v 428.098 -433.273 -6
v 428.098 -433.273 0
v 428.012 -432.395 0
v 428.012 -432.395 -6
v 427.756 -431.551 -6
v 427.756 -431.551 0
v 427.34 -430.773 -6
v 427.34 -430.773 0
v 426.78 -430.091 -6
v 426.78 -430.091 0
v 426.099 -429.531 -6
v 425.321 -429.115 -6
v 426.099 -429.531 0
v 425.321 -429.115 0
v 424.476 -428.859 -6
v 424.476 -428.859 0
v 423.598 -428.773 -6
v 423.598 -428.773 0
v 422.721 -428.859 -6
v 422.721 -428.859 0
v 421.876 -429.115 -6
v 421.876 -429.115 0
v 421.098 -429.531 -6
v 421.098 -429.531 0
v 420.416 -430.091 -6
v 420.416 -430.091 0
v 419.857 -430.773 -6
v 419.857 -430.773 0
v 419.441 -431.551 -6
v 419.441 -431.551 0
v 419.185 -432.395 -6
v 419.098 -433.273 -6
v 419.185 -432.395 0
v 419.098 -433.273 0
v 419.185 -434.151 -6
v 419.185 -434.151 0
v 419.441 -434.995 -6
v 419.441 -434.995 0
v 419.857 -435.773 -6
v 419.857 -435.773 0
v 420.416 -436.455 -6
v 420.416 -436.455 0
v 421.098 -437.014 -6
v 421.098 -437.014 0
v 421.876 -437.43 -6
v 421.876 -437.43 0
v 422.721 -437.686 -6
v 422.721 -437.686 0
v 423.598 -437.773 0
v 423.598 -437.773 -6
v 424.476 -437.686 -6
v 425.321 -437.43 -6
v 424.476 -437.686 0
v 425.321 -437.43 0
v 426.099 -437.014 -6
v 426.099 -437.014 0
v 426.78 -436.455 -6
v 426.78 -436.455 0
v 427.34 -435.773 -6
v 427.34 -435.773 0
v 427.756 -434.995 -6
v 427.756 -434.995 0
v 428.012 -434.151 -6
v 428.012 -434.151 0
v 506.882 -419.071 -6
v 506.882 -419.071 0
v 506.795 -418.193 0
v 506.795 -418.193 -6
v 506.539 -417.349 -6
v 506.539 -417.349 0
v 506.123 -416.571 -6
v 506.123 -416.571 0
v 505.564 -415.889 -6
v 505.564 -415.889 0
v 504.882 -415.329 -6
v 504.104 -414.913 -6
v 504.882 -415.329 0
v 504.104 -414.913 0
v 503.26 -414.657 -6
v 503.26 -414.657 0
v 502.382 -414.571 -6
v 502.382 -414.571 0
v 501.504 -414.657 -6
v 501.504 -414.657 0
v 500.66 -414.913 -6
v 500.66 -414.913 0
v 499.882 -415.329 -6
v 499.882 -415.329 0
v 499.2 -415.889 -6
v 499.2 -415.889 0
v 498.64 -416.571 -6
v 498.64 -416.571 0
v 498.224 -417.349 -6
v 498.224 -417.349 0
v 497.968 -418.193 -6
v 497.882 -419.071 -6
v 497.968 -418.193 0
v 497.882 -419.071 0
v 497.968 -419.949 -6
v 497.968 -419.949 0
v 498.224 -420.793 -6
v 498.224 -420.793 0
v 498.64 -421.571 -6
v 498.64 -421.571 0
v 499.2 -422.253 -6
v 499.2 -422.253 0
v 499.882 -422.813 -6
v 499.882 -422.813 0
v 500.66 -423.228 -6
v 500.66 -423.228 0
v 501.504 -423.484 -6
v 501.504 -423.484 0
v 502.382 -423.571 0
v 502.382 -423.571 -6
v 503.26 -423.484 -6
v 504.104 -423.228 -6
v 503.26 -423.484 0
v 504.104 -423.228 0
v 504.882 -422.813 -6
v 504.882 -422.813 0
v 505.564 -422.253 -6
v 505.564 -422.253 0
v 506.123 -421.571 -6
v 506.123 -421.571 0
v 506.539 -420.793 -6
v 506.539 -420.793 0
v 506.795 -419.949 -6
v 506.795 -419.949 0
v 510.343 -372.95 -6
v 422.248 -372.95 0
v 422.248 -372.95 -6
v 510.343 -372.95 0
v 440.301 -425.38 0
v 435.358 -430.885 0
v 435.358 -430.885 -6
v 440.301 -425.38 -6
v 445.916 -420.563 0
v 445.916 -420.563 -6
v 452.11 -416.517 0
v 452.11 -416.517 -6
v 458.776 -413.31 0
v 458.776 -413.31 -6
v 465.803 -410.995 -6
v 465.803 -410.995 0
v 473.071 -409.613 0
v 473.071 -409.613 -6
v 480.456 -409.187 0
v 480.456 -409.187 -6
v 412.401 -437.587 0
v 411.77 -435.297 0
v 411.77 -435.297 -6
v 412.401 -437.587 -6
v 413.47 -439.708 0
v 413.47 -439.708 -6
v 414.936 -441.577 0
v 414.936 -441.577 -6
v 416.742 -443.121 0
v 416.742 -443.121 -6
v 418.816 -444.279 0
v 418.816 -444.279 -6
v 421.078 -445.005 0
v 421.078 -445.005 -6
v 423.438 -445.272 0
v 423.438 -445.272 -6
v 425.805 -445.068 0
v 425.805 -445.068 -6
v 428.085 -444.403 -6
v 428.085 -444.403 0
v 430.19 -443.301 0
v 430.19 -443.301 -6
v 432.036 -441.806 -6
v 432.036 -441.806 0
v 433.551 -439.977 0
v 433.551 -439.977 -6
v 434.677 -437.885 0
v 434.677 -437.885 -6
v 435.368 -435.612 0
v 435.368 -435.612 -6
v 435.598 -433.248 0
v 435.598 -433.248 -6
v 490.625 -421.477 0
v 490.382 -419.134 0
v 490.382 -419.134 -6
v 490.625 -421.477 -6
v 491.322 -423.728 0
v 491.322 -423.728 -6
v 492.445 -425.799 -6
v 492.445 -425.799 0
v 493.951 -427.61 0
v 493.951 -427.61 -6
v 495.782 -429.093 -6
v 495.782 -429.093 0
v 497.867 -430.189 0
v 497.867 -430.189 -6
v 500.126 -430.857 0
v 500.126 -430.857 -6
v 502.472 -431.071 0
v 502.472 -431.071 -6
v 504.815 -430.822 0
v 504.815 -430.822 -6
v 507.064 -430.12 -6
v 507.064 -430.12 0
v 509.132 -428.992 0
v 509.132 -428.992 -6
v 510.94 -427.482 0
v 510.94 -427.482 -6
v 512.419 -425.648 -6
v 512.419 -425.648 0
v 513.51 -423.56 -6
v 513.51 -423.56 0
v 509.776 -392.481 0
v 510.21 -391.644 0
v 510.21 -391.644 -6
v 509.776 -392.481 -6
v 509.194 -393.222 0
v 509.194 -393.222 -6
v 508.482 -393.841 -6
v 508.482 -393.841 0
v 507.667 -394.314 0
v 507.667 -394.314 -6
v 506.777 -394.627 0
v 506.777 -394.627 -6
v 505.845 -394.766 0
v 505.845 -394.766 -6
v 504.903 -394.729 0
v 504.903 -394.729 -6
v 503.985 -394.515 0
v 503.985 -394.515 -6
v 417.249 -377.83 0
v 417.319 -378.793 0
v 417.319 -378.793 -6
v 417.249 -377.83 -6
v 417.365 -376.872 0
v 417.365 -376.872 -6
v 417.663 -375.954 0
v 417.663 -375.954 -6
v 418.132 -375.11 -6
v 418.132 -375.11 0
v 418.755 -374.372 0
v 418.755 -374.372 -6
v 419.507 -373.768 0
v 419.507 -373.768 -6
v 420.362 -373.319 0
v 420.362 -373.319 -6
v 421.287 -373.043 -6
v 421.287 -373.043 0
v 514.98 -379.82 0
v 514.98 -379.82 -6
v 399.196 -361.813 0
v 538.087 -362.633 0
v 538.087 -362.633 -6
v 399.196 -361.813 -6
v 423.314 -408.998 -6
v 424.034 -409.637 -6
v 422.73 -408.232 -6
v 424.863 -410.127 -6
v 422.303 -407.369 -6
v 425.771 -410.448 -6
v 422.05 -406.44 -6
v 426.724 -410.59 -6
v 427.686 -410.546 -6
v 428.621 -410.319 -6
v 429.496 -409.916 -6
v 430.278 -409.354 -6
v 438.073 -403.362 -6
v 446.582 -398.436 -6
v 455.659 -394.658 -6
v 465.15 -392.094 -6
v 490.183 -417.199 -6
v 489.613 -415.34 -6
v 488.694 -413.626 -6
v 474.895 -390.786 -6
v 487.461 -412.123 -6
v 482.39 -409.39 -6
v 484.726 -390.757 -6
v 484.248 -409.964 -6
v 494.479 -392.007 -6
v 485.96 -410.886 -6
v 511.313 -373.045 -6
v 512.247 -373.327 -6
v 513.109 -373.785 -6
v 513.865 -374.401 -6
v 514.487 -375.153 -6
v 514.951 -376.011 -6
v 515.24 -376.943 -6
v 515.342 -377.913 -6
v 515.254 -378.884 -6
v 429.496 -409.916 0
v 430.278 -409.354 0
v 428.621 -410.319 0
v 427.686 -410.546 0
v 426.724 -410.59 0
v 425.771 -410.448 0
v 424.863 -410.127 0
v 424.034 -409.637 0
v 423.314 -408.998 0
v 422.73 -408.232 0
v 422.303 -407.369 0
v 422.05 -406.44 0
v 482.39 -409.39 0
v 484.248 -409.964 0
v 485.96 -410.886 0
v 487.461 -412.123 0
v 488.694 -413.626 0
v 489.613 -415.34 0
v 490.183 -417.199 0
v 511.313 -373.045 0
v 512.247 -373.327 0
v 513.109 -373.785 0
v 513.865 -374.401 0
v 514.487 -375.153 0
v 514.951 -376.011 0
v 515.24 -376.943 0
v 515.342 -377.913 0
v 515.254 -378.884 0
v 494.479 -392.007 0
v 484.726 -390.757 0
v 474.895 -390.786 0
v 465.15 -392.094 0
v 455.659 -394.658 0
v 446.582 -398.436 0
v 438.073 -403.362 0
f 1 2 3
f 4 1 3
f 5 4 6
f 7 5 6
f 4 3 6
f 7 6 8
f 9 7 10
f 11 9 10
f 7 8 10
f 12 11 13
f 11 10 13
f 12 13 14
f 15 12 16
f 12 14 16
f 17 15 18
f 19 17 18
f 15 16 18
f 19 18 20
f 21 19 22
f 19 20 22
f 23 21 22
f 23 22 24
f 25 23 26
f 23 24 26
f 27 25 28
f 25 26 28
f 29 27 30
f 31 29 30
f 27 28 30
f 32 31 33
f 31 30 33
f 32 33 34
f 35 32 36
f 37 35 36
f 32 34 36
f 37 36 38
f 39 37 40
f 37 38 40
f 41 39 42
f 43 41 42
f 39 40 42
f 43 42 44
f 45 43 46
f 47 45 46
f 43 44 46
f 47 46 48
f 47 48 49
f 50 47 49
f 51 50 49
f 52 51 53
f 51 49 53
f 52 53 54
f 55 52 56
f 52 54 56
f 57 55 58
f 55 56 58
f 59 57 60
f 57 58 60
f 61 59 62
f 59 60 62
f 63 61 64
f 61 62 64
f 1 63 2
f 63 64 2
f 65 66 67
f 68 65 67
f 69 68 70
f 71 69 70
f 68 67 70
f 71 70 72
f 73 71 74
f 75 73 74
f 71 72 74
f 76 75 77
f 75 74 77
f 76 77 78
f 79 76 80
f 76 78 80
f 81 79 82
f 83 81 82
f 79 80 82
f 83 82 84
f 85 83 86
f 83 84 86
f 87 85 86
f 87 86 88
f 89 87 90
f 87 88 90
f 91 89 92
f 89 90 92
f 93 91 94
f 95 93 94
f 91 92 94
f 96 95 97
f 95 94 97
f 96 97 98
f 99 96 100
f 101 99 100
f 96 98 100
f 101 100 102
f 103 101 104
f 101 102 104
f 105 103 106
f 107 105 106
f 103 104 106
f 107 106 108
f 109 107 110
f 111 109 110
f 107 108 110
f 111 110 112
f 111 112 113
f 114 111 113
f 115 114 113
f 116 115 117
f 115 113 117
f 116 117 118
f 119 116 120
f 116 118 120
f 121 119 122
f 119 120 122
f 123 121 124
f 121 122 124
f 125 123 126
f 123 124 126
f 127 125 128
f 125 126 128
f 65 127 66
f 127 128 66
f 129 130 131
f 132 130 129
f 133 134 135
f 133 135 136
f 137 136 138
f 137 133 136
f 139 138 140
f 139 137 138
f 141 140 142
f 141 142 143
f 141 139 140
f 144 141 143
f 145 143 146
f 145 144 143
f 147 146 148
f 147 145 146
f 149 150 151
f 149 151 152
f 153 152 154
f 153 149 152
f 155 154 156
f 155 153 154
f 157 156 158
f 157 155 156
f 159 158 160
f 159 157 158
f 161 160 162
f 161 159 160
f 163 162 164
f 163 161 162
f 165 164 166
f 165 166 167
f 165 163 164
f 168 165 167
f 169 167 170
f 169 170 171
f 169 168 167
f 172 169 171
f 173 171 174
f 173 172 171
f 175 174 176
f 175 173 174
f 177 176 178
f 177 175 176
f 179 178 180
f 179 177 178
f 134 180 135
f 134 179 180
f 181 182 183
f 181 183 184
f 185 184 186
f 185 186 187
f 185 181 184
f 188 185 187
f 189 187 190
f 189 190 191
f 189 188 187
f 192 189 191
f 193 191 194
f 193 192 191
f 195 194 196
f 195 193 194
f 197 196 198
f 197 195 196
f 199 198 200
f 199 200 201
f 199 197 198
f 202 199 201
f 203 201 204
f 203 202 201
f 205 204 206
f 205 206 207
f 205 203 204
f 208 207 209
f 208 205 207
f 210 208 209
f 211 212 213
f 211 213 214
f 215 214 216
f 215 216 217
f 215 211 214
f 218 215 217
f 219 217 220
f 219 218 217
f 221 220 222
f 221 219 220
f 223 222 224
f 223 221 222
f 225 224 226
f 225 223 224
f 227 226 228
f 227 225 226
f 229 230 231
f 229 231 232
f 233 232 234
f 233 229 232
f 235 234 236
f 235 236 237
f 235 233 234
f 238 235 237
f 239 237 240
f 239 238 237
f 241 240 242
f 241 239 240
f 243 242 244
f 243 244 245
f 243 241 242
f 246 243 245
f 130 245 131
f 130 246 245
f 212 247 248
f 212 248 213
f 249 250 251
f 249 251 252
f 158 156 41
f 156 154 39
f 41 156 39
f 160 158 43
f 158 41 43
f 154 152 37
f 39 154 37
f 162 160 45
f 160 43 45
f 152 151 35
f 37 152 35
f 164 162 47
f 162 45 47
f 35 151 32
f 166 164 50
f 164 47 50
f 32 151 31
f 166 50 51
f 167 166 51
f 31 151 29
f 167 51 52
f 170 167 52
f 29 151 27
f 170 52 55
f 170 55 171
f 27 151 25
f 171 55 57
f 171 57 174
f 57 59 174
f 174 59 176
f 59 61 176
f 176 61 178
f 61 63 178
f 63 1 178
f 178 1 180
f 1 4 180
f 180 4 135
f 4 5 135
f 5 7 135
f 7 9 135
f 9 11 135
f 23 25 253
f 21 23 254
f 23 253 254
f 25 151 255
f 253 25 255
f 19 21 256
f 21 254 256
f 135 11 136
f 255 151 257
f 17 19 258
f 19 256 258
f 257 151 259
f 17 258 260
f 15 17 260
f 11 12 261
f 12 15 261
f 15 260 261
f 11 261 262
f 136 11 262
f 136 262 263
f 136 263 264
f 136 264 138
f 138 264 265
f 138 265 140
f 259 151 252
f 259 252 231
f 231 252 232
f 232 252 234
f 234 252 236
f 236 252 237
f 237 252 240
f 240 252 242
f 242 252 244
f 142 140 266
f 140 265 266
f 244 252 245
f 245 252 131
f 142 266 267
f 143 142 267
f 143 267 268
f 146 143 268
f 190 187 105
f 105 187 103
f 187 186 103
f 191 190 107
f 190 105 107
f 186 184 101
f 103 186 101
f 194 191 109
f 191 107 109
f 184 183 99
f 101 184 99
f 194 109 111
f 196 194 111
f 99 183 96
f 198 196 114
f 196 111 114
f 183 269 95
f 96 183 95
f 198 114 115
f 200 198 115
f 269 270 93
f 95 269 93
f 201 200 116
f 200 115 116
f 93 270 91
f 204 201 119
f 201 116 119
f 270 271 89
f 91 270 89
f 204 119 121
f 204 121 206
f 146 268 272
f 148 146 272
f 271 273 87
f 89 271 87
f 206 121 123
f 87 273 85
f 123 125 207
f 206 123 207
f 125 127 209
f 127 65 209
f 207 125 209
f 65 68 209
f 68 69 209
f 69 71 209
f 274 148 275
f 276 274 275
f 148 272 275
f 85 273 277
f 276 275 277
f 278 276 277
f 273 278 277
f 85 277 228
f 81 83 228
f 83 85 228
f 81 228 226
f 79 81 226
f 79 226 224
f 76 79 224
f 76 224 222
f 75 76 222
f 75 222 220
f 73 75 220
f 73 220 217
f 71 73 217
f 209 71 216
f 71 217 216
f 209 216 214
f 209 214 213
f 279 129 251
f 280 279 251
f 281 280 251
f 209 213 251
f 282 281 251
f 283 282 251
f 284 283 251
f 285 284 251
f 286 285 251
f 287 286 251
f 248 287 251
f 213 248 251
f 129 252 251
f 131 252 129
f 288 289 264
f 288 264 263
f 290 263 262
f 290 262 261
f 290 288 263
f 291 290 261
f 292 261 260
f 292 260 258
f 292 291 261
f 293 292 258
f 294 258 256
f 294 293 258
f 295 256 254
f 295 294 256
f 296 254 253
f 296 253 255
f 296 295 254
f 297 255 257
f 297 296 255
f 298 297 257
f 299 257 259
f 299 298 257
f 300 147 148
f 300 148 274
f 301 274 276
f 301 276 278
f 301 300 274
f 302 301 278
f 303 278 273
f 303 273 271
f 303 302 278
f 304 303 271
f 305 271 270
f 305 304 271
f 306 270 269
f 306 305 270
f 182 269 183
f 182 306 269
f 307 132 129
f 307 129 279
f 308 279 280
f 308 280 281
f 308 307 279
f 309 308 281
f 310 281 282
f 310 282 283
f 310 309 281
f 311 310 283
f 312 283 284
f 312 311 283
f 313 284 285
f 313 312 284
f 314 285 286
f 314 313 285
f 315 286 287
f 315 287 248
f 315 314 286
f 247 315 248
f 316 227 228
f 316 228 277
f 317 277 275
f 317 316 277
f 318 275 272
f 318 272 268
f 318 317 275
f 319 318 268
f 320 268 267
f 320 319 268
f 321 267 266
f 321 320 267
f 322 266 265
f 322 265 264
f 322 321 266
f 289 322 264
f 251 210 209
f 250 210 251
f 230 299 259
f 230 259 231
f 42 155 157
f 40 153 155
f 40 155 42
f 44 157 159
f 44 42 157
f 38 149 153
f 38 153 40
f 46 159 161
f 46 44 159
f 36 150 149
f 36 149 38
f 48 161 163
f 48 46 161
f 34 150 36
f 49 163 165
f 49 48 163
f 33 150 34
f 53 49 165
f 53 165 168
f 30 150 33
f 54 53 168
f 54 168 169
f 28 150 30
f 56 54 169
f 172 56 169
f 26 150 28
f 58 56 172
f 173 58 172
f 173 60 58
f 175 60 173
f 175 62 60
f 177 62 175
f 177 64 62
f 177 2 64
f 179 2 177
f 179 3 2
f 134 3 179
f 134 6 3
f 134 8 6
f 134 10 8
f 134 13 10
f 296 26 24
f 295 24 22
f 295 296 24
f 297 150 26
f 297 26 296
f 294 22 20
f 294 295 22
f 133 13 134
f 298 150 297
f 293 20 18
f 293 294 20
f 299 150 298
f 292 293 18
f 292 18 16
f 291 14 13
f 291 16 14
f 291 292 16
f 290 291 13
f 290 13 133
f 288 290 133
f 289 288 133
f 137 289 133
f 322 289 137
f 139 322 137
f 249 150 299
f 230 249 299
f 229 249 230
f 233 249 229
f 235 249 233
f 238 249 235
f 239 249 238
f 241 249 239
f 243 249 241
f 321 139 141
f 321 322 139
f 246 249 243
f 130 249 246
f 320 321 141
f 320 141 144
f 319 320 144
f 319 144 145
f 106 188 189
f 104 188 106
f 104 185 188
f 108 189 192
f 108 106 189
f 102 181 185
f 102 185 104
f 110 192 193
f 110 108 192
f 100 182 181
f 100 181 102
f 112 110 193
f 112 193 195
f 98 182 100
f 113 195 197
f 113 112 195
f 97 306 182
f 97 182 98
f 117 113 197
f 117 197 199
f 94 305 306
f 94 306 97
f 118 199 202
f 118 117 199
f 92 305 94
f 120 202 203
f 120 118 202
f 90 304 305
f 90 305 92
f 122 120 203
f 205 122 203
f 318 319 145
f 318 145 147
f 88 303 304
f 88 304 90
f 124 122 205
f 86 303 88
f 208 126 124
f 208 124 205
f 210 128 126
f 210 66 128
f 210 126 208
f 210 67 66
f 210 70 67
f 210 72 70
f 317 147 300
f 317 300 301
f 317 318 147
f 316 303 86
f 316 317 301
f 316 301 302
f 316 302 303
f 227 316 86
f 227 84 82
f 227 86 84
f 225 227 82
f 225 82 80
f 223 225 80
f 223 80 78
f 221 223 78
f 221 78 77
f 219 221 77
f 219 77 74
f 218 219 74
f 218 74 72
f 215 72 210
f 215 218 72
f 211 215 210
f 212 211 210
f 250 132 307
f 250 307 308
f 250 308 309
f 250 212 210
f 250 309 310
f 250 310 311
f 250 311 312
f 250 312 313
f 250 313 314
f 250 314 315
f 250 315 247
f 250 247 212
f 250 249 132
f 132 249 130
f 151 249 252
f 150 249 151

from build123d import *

# Parameters (mm, degrees)
SKETCH1_R           = 4.5
BOSS_EXTRUDE1_DEPTH = 6


with BuildPart() as part:
    # Sketch1 → Boss-Extrude1 (new body)
    with BuildSketch(Plane.XY):
        with BuildLine():
            Line((538.087061333, -362.632518419), (399.195756936, -361.813220805))
            Line((399.195756936, -361.813220805), (411.770395569, -435.296905236))
            ThreePointArc((411.770395569, -435.296905236), (425.804925586, -445.068271221), (435.358389017, -430.884514226))
            ThreePointArc((435.358389017, -430.884514226), (455.39069986, -414.804899258), (480.456241604, -409.186526513))
            ThreePointArc((480.456241604, -409.186526513), (487.46072005, -412.122937916), (490.381767865, -419.133837281))
            ThreePointArc((490.381767865, -419.133837281), (500.126063062, -430.857058146), (513.510317286, -423.560008386))
            Line((513.510317286, -423.560008386), (538.087061333, -362.632518419))
        make_face()
        with Locations((423.598466956, -433.272867865)):
            Circle(SKETCH1_R, mode=Mode.SUBTRACT)
        with Locations((502.381603037, -419.070941762)):
            Circle(SKETCH1_R, mode=Mode.SUBTRACT)
        with BuildLine():
            ThreePointArc((510.342575031, -372.949836208), (514.486982235, -375.152714664), (514.979539302, -379.820280635))
            Line((514.979539302, -379.820280635), (510.209986836, -391.644339161))
            ThreePointArc((510.209986836, -391.644339161), (507.666881017, -394.314352508), (503.985021193, -394.515018193))
            ThreePointArc((503.985021193, -394.515018193), (465.150215538, -392.093753549), (430.277606866, -409.353701903))
            ThreePointArc((430.277606866, -409.353701903), (425.309411141, -410.309514397), (422.050350523, -406.439750816))
            Line((422.050350523, -406.439750816), (417.319428607, -378.793185112))
            ThreePointArc((417.319428607, -378.793185112), (418.425701646, -374.726231434), (422.247791685, -372.949836208))
            Line((422.247791685, -372.949836208), (510.342575031, -372.949836208))
        make_face(mode=Mode.SUBTRACT)
    extrude(amount=-BOSS_EXTRUDE1_DEPTH)


solid = part.part
